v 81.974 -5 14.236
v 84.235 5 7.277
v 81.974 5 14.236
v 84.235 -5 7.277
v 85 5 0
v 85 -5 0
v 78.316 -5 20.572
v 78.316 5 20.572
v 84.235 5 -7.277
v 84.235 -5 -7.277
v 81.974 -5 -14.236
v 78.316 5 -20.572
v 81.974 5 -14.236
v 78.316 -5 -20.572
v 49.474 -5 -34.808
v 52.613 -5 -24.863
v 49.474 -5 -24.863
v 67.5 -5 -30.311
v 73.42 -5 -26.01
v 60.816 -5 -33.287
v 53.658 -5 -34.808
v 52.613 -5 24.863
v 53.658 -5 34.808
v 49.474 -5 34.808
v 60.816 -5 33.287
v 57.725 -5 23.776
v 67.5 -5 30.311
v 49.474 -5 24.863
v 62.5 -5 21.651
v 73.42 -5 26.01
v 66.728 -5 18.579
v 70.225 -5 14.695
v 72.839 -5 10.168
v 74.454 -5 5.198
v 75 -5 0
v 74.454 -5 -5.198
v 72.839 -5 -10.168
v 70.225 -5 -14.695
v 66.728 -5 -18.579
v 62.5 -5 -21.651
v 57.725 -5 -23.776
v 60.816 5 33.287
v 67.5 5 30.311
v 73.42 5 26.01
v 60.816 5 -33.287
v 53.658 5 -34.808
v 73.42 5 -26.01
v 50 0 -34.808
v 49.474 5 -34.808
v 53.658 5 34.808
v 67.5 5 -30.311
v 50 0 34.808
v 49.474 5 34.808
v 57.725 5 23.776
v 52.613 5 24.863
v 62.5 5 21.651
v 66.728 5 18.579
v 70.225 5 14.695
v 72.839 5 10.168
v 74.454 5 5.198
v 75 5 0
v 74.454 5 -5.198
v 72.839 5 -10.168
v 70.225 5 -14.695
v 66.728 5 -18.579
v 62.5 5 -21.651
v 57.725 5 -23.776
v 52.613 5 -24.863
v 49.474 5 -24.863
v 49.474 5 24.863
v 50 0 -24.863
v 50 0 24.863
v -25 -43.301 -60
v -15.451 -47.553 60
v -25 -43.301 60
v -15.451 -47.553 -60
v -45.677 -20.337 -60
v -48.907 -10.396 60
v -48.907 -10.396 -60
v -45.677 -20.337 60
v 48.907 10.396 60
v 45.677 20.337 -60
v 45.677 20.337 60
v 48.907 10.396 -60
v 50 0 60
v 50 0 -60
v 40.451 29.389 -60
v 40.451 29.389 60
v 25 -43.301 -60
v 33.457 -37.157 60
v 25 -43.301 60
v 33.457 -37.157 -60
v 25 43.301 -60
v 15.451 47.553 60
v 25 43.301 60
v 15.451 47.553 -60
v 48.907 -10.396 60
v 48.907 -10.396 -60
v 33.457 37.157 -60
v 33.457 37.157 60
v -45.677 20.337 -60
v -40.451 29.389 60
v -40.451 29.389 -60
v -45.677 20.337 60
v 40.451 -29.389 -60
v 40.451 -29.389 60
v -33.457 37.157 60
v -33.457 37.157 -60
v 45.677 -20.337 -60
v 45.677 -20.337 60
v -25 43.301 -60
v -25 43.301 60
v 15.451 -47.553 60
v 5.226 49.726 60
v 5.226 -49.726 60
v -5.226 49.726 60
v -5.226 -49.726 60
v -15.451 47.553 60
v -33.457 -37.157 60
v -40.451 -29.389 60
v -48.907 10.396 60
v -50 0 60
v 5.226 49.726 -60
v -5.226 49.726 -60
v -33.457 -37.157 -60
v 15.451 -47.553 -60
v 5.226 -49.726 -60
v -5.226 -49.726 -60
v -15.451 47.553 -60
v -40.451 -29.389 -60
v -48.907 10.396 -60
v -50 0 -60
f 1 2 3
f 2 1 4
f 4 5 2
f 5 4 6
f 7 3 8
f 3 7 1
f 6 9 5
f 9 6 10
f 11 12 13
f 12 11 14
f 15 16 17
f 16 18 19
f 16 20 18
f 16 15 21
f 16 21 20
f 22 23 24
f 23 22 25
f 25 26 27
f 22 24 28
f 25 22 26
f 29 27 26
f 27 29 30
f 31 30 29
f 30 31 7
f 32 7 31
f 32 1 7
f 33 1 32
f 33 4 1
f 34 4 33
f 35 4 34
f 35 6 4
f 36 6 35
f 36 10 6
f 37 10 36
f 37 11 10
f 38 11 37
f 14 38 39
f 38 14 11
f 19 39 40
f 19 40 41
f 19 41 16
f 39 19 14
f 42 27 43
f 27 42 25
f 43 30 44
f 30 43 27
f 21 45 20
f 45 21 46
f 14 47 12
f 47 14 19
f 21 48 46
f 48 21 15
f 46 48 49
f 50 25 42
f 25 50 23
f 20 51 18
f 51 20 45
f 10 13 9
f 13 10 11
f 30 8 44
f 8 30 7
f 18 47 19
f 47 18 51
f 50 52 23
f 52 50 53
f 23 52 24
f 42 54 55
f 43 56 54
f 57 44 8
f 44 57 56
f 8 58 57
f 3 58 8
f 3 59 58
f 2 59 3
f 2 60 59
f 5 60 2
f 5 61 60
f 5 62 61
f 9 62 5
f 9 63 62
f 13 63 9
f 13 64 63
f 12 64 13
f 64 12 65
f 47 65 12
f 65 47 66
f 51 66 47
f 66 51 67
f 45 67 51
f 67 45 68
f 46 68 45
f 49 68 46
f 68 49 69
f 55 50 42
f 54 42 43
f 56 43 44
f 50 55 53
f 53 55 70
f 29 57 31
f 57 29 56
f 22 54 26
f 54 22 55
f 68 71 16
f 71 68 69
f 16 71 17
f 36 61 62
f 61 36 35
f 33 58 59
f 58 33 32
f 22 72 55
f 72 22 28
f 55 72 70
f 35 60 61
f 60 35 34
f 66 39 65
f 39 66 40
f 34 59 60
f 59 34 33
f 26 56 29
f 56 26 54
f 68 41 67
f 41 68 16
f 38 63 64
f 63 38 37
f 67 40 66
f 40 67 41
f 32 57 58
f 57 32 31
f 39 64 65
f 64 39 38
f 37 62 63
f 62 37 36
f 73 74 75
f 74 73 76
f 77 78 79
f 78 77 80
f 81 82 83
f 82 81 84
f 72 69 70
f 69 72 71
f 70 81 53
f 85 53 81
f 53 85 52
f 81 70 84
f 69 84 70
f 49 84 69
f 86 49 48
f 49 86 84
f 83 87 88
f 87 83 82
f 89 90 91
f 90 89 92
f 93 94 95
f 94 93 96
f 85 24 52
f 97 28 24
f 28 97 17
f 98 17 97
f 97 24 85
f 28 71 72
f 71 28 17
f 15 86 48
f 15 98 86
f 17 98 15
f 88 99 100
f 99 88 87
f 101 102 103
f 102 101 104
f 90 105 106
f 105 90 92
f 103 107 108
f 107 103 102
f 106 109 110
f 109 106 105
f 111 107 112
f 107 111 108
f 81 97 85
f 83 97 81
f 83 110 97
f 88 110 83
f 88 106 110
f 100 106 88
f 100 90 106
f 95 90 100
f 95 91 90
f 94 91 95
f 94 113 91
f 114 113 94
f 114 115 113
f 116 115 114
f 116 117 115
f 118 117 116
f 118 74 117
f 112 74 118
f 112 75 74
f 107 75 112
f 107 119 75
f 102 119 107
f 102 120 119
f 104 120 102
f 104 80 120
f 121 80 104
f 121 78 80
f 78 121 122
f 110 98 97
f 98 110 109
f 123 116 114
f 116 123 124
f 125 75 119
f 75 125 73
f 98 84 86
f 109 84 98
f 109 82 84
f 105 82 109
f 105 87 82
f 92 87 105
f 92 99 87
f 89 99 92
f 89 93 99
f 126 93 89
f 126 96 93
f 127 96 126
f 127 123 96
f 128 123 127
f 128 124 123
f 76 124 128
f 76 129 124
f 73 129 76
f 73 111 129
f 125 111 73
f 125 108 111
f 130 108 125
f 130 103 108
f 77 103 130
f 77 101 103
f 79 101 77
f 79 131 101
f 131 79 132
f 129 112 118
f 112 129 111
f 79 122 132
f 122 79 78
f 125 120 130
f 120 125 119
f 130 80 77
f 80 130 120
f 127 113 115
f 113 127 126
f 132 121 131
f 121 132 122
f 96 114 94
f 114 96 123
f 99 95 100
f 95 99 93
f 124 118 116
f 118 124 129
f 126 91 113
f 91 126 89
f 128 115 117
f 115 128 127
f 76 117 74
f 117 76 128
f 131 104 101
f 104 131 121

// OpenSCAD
//Mug
union(){
	cylinder(d=100,h=120, center=true);
	translate([50,0,0]){
		rotate([90,0,0]){
			difference(){
				cylinder(d=70,h=10,center=true);
				cylinder(d=50,h=20,center=true);
			}
		}
	}
}
